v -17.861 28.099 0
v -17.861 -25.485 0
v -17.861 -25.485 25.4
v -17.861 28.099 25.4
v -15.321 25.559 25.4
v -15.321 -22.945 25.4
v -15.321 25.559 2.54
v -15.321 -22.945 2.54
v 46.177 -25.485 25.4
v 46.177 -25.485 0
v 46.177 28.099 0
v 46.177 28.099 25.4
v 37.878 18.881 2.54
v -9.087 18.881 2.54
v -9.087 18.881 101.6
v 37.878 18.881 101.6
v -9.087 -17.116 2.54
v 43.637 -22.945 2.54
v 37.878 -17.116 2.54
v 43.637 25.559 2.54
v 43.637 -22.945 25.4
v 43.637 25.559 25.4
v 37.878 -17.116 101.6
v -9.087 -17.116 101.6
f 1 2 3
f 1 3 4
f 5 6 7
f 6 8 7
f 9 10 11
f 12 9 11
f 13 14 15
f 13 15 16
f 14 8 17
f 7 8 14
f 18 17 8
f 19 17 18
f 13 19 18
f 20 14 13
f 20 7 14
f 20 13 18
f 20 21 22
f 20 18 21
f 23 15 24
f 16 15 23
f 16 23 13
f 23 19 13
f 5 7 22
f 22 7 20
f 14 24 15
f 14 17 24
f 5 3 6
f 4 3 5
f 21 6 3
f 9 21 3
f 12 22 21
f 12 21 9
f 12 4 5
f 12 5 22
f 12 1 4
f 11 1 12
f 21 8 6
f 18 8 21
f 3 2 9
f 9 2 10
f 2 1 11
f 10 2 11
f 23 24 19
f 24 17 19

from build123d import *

# Parameters (mm, degrees)
F0_W     = 64.0385448933
F0_H     = 53.5832680762
F1_DEPTH = 25.4
F2_T     = -2.54
F3_W     = 46.9654425979
F3_H     = 35.9974689782
F4_DEPTH = 76.2
F5_W     = 46.9654425979
F5_H     = 35.9974689782
F6_DEPTH = 25.4


with BuildPart() as f1:
    # F0 (on Top) → F1 (new body)
    with BuildSketch(Plane.XY):
        with Locations((14.1581892967, 1.3069082052)):
            Rectangle(F0_W, F0_H)
    extrude(amount=F1_DEPTH)

    # F2
    f2_openings = [f1.faces().sort_by_distance(p)[0] for p in [
        (14.158189, 1.306908, 25.4),
    ]]
    offset(amount=F2_T, openings=f2_openings)

    # F3 (on Top) → F4 (join)
    with BuildSketch(Plane.XY):
        with Locations((14.3955796957, 0.8823070675)):
            Rectangle(F3_W, F3_H)
    extrude(amount=F4_DEPTH)

    # F5 (on face) → F6 (join)
    with BuildSketch(Plane.XY.offset(76.2)):
        with Locations((14.3955796957, 0.8823070675)):
            Rectangle(F5_W, F5_H)
    extrude(amount=F6_DEPTH)


solid = f1.part
